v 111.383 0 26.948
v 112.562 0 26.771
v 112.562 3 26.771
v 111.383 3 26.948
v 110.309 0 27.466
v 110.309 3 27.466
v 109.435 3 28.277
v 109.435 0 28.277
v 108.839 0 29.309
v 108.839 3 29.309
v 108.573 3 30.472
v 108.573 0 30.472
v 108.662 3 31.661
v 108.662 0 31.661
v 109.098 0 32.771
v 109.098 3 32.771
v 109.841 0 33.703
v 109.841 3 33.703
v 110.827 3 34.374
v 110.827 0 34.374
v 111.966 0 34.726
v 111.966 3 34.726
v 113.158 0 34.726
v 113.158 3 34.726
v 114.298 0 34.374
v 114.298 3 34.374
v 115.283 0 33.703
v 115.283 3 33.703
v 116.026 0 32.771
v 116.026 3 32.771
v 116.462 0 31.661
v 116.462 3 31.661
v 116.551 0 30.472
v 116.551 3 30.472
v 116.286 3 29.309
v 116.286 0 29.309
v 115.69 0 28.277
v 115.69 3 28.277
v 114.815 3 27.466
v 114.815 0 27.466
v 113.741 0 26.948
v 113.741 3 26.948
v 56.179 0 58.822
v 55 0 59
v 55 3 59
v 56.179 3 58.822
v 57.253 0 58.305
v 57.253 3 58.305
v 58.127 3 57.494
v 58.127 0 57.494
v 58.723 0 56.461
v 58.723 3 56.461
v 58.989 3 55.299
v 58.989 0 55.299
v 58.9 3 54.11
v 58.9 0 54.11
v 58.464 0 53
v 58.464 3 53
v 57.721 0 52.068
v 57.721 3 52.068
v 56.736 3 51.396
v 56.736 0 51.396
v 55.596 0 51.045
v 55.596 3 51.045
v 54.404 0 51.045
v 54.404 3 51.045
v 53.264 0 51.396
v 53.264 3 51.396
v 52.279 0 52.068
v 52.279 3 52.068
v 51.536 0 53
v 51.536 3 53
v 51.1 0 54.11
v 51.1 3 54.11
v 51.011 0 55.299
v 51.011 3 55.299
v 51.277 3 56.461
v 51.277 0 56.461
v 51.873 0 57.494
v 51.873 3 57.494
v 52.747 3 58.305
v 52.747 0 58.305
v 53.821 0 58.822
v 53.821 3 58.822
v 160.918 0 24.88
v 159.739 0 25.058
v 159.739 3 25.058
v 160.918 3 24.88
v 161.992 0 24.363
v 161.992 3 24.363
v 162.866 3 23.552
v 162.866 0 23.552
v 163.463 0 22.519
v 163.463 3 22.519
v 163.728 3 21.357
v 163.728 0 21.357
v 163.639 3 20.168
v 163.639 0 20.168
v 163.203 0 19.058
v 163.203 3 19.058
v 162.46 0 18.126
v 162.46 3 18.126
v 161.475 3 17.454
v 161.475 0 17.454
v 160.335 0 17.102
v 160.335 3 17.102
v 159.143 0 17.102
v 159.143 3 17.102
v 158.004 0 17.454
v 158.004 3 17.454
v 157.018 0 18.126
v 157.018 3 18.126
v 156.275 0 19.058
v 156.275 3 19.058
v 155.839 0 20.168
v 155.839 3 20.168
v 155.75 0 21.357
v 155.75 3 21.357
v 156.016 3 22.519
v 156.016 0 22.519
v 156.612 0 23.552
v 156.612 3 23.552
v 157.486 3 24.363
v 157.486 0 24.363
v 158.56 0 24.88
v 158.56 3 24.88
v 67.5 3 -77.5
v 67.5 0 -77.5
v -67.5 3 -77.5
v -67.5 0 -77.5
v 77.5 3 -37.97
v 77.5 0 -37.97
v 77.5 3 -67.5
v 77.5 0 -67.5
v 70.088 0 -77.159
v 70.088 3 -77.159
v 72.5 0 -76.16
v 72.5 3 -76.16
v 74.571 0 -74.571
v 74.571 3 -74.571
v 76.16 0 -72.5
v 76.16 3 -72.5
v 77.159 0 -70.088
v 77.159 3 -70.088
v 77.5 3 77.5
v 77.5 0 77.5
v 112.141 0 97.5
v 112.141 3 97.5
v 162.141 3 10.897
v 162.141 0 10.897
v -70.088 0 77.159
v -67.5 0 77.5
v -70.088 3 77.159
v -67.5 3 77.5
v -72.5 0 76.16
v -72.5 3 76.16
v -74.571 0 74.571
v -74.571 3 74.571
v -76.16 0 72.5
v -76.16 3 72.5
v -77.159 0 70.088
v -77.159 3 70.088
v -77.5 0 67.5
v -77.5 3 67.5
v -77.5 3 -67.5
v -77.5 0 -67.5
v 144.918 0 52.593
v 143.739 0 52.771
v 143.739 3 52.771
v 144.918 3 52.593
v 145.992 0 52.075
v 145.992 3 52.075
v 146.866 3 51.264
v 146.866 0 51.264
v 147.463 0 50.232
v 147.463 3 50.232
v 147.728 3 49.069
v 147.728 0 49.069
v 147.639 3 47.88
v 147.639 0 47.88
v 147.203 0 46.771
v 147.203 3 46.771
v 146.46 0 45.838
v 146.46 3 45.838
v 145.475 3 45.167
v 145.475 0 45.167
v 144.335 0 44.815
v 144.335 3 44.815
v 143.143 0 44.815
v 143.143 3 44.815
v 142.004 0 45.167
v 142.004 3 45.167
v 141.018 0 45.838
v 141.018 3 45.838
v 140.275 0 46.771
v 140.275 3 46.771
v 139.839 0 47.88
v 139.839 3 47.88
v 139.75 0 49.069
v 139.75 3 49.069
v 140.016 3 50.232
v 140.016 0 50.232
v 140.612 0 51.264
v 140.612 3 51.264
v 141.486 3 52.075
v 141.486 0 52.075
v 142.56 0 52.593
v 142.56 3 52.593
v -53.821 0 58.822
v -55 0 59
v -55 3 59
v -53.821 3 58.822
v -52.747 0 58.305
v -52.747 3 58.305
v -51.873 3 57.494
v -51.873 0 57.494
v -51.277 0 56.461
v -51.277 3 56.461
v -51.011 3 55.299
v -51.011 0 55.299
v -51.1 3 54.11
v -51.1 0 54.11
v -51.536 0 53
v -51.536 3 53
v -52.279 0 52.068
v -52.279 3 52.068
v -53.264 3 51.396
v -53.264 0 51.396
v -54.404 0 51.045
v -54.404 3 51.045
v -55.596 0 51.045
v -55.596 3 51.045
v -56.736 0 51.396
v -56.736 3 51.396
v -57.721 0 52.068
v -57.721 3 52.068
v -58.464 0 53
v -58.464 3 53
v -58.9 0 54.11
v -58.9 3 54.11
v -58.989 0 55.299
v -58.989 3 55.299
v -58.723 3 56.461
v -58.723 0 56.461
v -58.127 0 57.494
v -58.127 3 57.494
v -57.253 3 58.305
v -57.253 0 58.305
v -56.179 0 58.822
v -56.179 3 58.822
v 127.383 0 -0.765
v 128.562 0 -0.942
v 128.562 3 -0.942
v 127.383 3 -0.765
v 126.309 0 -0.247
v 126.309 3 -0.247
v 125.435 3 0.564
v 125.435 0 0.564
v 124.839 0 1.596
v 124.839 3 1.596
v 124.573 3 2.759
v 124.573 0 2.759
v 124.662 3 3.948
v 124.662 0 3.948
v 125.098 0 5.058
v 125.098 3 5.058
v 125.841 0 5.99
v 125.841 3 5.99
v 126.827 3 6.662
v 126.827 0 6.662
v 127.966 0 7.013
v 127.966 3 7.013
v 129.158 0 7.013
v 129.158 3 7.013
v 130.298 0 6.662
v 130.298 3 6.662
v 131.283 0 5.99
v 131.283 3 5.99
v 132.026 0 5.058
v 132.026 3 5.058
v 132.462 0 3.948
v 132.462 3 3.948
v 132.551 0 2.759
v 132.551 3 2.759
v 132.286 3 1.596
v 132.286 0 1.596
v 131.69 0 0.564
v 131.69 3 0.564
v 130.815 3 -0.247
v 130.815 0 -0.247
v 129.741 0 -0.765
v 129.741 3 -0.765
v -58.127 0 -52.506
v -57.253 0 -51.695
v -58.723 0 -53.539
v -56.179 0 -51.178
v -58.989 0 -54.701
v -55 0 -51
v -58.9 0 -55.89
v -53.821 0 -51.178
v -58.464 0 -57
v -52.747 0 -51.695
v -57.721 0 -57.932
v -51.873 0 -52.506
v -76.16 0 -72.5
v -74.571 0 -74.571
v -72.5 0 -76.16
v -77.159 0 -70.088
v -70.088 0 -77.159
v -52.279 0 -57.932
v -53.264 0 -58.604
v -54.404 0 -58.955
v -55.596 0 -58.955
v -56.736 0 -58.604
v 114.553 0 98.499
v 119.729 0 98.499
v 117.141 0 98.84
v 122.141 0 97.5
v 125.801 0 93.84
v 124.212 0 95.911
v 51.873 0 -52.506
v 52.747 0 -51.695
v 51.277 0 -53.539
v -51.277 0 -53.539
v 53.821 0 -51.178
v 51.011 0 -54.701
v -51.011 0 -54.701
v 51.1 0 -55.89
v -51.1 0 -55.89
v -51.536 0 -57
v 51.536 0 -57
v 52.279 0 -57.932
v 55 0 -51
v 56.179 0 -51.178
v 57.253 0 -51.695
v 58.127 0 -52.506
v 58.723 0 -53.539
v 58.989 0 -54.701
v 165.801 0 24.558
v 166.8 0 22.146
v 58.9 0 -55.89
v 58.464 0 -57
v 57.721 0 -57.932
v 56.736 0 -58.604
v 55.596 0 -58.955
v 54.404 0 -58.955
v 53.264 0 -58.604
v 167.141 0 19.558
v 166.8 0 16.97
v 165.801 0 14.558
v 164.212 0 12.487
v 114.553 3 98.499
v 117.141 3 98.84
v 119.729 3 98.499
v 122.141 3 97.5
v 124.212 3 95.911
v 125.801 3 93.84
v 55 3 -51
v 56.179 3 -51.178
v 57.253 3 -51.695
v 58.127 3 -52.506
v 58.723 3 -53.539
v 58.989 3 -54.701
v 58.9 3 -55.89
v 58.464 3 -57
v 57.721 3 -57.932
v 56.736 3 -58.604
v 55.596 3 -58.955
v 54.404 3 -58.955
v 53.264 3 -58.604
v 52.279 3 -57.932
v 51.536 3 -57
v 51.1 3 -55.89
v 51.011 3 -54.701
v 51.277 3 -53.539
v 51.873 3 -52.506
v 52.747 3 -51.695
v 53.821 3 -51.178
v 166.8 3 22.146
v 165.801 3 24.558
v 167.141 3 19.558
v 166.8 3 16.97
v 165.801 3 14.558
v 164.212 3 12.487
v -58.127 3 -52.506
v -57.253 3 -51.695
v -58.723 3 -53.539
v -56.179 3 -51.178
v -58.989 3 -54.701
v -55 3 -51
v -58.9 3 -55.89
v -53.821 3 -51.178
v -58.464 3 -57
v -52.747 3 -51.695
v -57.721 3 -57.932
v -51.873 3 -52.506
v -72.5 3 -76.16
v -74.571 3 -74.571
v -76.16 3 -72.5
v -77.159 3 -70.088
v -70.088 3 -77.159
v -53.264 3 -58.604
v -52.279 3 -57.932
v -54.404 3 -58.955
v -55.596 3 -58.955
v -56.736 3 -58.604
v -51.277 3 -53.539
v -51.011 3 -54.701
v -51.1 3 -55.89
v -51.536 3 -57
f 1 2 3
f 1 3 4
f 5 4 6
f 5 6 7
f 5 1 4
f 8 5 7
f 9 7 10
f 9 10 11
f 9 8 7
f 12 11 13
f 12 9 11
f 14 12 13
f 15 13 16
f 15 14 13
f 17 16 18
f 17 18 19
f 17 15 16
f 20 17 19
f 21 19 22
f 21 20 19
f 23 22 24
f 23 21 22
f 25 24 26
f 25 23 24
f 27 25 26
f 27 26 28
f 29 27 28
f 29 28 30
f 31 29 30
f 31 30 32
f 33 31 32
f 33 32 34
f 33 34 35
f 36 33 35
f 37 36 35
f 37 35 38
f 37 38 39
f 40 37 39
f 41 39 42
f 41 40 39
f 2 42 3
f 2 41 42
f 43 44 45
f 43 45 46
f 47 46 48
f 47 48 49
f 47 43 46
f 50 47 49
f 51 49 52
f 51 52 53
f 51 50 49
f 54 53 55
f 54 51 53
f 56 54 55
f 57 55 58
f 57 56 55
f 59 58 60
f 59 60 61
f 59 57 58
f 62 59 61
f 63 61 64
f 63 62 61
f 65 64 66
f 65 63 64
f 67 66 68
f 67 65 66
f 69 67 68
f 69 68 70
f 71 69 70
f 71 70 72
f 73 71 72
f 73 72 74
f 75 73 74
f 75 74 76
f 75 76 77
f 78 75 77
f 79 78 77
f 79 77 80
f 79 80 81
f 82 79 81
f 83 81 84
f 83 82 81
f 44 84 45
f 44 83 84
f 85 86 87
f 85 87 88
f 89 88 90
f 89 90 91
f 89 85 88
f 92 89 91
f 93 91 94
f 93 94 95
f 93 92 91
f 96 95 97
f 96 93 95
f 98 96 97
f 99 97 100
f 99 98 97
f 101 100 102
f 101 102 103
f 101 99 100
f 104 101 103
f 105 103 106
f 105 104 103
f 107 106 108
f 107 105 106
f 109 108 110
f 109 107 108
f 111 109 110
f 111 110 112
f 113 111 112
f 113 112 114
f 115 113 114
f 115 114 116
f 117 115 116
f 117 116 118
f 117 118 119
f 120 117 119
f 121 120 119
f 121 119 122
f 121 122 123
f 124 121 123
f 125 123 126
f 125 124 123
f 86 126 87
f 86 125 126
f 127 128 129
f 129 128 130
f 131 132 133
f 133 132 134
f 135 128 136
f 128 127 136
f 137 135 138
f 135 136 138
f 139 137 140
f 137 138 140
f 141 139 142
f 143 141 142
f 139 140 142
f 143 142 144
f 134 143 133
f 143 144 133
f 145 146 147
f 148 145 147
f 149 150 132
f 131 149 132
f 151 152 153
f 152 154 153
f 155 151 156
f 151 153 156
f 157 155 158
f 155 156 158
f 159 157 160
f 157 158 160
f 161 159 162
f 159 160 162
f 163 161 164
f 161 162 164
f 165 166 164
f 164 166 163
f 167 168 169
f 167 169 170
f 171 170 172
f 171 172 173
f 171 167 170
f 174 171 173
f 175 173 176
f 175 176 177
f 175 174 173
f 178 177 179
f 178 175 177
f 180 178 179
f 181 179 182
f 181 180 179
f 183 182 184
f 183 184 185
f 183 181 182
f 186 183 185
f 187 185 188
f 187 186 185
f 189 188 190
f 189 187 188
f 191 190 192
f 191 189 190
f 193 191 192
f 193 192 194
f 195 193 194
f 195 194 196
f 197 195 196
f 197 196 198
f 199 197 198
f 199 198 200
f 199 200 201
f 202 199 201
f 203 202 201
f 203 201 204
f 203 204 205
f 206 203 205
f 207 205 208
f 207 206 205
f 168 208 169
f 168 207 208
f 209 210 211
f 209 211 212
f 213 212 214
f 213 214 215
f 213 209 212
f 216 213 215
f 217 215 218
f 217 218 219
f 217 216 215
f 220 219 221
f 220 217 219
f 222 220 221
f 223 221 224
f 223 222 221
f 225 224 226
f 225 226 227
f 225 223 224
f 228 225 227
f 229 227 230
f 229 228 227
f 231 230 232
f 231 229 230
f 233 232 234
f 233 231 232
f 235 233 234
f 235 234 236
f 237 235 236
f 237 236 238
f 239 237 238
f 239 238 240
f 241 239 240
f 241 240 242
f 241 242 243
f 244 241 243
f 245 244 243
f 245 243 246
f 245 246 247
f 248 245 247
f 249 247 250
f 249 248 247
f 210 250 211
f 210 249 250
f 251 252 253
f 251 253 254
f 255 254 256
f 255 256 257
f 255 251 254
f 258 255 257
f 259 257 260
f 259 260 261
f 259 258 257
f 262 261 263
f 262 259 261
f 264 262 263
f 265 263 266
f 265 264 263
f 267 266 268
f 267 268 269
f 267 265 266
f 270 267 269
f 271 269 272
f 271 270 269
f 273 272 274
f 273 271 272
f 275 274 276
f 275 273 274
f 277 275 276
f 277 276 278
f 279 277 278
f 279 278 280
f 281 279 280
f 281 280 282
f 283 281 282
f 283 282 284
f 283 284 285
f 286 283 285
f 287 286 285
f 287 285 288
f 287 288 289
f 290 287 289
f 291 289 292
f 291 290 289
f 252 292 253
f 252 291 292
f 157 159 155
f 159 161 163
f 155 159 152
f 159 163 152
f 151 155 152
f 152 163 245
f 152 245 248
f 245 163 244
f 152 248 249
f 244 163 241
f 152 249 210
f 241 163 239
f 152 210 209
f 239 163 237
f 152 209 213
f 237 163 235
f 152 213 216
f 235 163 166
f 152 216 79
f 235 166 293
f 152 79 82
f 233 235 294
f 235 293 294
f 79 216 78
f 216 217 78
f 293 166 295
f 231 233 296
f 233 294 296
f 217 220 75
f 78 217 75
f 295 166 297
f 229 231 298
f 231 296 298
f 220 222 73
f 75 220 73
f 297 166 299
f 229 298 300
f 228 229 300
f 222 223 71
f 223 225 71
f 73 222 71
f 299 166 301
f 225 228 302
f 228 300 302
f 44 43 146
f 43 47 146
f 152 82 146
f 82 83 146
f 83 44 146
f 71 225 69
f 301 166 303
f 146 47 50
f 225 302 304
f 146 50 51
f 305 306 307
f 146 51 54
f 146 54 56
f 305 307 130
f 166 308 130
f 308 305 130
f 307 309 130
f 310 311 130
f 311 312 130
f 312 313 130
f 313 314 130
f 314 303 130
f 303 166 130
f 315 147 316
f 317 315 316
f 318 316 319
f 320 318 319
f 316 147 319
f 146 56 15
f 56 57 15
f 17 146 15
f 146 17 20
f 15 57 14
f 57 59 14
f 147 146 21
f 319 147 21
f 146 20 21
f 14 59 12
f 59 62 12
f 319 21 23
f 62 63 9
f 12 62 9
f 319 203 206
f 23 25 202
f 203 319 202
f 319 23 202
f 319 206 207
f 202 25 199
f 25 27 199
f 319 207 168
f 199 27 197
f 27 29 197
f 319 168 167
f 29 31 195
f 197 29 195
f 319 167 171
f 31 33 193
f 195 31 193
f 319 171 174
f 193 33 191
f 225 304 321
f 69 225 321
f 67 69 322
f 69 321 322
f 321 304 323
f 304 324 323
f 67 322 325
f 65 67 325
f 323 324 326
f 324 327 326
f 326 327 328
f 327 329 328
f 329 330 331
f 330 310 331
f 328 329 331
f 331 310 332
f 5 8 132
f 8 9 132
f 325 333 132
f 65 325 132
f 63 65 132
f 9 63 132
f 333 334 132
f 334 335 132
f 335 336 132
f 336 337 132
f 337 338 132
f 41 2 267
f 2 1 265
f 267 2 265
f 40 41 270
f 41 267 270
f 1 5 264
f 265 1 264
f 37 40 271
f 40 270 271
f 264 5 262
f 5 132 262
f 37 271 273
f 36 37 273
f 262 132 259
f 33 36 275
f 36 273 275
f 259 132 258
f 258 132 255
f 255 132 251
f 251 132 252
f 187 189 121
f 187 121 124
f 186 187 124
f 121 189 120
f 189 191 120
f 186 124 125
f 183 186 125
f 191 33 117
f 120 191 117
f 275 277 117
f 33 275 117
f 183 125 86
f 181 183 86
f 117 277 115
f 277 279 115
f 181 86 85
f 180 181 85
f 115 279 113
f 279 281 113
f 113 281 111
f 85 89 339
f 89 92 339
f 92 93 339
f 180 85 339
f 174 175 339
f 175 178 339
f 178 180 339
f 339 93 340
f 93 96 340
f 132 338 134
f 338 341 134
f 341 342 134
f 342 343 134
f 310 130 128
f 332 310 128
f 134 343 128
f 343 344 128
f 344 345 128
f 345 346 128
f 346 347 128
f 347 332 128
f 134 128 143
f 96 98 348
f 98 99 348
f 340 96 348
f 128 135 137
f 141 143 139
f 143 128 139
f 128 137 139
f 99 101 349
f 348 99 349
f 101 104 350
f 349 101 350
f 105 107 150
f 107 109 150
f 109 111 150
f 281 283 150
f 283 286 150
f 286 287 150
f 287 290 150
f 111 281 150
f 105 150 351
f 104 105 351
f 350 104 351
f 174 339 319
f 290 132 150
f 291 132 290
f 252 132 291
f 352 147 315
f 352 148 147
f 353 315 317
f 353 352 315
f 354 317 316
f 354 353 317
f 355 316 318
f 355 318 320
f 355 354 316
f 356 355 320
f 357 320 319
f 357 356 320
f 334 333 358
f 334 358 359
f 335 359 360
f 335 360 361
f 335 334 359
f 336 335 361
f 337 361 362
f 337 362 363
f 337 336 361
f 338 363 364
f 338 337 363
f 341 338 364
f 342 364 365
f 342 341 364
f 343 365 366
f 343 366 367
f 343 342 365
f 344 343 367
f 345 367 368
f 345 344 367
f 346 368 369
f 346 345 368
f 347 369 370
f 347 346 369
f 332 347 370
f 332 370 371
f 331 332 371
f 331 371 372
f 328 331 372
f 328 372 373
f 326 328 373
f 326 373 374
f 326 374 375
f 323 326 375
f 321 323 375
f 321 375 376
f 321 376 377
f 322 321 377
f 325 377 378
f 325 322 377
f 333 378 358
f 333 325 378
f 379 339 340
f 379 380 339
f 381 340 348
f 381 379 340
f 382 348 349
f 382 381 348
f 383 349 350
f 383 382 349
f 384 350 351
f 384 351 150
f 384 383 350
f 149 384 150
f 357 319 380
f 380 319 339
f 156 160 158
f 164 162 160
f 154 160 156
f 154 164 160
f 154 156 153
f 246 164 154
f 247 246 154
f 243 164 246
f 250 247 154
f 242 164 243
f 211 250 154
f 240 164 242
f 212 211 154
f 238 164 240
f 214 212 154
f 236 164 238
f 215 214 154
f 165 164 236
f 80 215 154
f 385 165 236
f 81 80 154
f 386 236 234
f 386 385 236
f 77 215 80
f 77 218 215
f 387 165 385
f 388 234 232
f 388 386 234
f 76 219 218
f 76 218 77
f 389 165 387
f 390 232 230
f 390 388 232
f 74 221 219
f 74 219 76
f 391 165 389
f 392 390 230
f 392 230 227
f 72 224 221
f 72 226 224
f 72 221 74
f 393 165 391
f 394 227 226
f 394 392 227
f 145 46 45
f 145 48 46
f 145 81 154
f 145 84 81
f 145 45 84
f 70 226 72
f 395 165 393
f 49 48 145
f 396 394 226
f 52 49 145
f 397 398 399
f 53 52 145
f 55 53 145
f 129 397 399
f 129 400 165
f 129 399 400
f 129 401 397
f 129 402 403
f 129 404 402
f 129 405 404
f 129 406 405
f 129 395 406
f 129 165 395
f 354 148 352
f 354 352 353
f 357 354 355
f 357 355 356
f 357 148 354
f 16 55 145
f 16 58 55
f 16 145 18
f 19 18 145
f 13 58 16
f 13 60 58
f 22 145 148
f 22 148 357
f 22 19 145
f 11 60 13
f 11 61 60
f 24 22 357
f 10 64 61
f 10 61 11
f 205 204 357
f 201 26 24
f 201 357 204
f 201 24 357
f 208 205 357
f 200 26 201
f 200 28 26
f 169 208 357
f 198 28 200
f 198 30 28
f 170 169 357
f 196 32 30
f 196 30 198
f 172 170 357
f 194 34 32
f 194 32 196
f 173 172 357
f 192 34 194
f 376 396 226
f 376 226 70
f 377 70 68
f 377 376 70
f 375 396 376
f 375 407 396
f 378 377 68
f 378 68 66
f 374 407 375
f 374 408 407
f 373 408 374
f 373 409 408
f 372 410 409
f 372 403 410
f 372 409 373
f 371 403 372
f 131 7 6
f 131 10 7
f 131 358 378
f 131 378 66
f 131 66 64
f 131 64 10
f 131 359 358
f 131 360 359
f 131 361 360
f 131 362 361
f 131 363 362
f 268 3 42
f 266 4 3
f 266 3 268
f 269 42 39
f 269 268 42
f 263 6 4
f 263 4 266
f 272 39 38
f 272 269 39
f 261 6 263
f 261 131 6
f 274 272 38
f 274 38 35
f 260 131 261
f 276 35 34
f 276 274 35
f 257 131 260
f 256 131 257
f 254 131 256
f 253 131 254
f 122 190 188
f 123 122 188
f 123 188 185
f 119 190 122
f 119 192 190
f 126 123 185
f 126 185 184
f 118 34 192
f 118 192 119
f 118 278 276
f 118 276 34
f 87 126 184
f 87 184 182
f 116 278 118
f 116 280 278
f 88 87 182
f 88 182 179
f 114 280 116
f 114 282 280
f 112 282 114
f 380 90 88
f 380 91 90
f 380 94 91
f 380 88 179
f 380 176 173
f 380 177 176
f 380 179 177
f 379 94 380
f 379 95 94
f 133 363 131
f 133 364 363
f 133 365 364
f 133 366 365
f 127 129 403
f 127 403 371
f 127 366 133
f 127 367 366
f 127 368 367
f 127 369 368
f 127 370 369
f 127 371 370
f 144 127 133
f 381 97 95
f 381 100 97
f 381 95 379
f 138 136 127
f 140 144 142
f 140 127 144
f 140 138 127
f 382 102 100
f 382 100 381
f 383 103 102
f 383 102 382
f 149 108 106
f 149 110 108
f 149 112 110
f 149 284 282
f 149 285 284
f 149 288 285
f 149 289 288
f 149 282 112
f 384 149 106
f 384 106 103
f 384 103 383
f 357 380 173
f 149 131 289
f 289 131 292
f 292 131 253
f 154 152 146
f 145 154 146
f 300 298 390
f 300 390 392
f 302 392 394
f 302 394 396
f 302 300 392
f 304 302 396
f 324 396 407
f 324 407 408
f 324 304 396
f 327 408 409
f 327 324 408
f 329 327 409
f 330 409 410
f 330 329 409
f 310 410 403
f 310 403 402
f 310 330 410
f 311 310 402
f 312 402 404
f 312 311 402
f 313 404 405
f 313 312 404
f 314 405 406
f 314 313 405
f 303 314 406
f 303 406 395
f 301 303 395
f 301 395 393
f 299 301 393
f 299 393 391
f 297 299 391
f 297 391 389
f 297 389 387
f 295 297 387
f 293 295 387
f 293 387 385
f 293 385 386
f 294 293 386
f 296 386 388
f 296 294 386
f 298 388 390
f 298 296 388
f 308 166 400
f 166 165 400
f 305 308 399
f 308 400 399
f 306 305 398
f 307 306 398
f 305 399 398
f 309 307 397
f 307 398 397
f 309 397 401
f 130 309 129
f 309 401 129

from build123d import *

# Parameters (mm, degrees)
SZKIC1_R                    = 4
DODANIE_WYCI_GNI_CIE1_DEPTH = 3
ZAOKR_GLENIE1_R             = 10


with BuildPart() as part:
    # Szkic1 → Dodanie-wyciągnięcie1 (new body)
    with BuildSketch(Plane(origin=(0, 0, 0), x_dir=(1, 0, 0), z_dir=(0, 1, 0))):
        Polygon((77.5, -77.5), (120.801270189, -102.5), (170.801270189, -15.897459622), (77.5, 37.970053838), (77.5, 77.5), (-77.5, 77.5), (-77.5, -77.5), align=None)
        with Locations(Location((-55, 55, 0), (0, 0, 270))):
            Circle(SZKIC1_R, mode=Mode.SUBTRACT)
        with Locations(Location((55, 55, 0), (0, 0, 270))):
            Circle(SZKIC1_R, mode=Mode.SUBTRACT)
        with Locations(Location((55, -55, 0), (0, 0, 270))):
            Circle(SZKIC1_R, mode=Mode.SUBTRACT)
        with Locations(Location((-55, -55, 0), (0, 0, 270))):
            Circle(SZKIC1_R, mode=Mode.SUBTRACT)
        with Locations(Location((159.739092363, -21.057713659, 0), (0, 0, 270))):
            Circle(SZKIC1_R, mode=Mode.SUBTRACT)
        with Locations(Location((143.739092363, -48.770526581, 0), (0, 0, 270))):
            Circle(SZKIC1_R, mode=Mode.SUBTRACT)
        with Locations(Location((128.562177826, -3.057713659, 0), (0, 0, 90))):
            Circle(SZKIC1_R, mode=Mode.SUBTRACT)
        with Locations(Location((112.562177826, -30.770526581, 0), (0, 0, 90))):
            Circle(SZKIC1_R, mode=Mode.SUBTRACT)
    extrude(amount=DODANIE_WYCI_GNI_CIE1_DEPTH)

    # Zaokrąglenie1
    zaokr_glenie1_edges = [part.edges().sort_by_distance(p)[0] for p in [
        (-77.5, 1.5, -77.5),
        (77.5, 1.5, -77.5),
        (170.801270189, 1.5, 15.897459622),
        (120.801270189, 1.5, 102.5),
        (-77.5, 1.5, 77.5),
    ]]
    fillet(zaokr_glenie1_edges, radius=ZAOKR_GLENIE1_R)


solid = part.part
